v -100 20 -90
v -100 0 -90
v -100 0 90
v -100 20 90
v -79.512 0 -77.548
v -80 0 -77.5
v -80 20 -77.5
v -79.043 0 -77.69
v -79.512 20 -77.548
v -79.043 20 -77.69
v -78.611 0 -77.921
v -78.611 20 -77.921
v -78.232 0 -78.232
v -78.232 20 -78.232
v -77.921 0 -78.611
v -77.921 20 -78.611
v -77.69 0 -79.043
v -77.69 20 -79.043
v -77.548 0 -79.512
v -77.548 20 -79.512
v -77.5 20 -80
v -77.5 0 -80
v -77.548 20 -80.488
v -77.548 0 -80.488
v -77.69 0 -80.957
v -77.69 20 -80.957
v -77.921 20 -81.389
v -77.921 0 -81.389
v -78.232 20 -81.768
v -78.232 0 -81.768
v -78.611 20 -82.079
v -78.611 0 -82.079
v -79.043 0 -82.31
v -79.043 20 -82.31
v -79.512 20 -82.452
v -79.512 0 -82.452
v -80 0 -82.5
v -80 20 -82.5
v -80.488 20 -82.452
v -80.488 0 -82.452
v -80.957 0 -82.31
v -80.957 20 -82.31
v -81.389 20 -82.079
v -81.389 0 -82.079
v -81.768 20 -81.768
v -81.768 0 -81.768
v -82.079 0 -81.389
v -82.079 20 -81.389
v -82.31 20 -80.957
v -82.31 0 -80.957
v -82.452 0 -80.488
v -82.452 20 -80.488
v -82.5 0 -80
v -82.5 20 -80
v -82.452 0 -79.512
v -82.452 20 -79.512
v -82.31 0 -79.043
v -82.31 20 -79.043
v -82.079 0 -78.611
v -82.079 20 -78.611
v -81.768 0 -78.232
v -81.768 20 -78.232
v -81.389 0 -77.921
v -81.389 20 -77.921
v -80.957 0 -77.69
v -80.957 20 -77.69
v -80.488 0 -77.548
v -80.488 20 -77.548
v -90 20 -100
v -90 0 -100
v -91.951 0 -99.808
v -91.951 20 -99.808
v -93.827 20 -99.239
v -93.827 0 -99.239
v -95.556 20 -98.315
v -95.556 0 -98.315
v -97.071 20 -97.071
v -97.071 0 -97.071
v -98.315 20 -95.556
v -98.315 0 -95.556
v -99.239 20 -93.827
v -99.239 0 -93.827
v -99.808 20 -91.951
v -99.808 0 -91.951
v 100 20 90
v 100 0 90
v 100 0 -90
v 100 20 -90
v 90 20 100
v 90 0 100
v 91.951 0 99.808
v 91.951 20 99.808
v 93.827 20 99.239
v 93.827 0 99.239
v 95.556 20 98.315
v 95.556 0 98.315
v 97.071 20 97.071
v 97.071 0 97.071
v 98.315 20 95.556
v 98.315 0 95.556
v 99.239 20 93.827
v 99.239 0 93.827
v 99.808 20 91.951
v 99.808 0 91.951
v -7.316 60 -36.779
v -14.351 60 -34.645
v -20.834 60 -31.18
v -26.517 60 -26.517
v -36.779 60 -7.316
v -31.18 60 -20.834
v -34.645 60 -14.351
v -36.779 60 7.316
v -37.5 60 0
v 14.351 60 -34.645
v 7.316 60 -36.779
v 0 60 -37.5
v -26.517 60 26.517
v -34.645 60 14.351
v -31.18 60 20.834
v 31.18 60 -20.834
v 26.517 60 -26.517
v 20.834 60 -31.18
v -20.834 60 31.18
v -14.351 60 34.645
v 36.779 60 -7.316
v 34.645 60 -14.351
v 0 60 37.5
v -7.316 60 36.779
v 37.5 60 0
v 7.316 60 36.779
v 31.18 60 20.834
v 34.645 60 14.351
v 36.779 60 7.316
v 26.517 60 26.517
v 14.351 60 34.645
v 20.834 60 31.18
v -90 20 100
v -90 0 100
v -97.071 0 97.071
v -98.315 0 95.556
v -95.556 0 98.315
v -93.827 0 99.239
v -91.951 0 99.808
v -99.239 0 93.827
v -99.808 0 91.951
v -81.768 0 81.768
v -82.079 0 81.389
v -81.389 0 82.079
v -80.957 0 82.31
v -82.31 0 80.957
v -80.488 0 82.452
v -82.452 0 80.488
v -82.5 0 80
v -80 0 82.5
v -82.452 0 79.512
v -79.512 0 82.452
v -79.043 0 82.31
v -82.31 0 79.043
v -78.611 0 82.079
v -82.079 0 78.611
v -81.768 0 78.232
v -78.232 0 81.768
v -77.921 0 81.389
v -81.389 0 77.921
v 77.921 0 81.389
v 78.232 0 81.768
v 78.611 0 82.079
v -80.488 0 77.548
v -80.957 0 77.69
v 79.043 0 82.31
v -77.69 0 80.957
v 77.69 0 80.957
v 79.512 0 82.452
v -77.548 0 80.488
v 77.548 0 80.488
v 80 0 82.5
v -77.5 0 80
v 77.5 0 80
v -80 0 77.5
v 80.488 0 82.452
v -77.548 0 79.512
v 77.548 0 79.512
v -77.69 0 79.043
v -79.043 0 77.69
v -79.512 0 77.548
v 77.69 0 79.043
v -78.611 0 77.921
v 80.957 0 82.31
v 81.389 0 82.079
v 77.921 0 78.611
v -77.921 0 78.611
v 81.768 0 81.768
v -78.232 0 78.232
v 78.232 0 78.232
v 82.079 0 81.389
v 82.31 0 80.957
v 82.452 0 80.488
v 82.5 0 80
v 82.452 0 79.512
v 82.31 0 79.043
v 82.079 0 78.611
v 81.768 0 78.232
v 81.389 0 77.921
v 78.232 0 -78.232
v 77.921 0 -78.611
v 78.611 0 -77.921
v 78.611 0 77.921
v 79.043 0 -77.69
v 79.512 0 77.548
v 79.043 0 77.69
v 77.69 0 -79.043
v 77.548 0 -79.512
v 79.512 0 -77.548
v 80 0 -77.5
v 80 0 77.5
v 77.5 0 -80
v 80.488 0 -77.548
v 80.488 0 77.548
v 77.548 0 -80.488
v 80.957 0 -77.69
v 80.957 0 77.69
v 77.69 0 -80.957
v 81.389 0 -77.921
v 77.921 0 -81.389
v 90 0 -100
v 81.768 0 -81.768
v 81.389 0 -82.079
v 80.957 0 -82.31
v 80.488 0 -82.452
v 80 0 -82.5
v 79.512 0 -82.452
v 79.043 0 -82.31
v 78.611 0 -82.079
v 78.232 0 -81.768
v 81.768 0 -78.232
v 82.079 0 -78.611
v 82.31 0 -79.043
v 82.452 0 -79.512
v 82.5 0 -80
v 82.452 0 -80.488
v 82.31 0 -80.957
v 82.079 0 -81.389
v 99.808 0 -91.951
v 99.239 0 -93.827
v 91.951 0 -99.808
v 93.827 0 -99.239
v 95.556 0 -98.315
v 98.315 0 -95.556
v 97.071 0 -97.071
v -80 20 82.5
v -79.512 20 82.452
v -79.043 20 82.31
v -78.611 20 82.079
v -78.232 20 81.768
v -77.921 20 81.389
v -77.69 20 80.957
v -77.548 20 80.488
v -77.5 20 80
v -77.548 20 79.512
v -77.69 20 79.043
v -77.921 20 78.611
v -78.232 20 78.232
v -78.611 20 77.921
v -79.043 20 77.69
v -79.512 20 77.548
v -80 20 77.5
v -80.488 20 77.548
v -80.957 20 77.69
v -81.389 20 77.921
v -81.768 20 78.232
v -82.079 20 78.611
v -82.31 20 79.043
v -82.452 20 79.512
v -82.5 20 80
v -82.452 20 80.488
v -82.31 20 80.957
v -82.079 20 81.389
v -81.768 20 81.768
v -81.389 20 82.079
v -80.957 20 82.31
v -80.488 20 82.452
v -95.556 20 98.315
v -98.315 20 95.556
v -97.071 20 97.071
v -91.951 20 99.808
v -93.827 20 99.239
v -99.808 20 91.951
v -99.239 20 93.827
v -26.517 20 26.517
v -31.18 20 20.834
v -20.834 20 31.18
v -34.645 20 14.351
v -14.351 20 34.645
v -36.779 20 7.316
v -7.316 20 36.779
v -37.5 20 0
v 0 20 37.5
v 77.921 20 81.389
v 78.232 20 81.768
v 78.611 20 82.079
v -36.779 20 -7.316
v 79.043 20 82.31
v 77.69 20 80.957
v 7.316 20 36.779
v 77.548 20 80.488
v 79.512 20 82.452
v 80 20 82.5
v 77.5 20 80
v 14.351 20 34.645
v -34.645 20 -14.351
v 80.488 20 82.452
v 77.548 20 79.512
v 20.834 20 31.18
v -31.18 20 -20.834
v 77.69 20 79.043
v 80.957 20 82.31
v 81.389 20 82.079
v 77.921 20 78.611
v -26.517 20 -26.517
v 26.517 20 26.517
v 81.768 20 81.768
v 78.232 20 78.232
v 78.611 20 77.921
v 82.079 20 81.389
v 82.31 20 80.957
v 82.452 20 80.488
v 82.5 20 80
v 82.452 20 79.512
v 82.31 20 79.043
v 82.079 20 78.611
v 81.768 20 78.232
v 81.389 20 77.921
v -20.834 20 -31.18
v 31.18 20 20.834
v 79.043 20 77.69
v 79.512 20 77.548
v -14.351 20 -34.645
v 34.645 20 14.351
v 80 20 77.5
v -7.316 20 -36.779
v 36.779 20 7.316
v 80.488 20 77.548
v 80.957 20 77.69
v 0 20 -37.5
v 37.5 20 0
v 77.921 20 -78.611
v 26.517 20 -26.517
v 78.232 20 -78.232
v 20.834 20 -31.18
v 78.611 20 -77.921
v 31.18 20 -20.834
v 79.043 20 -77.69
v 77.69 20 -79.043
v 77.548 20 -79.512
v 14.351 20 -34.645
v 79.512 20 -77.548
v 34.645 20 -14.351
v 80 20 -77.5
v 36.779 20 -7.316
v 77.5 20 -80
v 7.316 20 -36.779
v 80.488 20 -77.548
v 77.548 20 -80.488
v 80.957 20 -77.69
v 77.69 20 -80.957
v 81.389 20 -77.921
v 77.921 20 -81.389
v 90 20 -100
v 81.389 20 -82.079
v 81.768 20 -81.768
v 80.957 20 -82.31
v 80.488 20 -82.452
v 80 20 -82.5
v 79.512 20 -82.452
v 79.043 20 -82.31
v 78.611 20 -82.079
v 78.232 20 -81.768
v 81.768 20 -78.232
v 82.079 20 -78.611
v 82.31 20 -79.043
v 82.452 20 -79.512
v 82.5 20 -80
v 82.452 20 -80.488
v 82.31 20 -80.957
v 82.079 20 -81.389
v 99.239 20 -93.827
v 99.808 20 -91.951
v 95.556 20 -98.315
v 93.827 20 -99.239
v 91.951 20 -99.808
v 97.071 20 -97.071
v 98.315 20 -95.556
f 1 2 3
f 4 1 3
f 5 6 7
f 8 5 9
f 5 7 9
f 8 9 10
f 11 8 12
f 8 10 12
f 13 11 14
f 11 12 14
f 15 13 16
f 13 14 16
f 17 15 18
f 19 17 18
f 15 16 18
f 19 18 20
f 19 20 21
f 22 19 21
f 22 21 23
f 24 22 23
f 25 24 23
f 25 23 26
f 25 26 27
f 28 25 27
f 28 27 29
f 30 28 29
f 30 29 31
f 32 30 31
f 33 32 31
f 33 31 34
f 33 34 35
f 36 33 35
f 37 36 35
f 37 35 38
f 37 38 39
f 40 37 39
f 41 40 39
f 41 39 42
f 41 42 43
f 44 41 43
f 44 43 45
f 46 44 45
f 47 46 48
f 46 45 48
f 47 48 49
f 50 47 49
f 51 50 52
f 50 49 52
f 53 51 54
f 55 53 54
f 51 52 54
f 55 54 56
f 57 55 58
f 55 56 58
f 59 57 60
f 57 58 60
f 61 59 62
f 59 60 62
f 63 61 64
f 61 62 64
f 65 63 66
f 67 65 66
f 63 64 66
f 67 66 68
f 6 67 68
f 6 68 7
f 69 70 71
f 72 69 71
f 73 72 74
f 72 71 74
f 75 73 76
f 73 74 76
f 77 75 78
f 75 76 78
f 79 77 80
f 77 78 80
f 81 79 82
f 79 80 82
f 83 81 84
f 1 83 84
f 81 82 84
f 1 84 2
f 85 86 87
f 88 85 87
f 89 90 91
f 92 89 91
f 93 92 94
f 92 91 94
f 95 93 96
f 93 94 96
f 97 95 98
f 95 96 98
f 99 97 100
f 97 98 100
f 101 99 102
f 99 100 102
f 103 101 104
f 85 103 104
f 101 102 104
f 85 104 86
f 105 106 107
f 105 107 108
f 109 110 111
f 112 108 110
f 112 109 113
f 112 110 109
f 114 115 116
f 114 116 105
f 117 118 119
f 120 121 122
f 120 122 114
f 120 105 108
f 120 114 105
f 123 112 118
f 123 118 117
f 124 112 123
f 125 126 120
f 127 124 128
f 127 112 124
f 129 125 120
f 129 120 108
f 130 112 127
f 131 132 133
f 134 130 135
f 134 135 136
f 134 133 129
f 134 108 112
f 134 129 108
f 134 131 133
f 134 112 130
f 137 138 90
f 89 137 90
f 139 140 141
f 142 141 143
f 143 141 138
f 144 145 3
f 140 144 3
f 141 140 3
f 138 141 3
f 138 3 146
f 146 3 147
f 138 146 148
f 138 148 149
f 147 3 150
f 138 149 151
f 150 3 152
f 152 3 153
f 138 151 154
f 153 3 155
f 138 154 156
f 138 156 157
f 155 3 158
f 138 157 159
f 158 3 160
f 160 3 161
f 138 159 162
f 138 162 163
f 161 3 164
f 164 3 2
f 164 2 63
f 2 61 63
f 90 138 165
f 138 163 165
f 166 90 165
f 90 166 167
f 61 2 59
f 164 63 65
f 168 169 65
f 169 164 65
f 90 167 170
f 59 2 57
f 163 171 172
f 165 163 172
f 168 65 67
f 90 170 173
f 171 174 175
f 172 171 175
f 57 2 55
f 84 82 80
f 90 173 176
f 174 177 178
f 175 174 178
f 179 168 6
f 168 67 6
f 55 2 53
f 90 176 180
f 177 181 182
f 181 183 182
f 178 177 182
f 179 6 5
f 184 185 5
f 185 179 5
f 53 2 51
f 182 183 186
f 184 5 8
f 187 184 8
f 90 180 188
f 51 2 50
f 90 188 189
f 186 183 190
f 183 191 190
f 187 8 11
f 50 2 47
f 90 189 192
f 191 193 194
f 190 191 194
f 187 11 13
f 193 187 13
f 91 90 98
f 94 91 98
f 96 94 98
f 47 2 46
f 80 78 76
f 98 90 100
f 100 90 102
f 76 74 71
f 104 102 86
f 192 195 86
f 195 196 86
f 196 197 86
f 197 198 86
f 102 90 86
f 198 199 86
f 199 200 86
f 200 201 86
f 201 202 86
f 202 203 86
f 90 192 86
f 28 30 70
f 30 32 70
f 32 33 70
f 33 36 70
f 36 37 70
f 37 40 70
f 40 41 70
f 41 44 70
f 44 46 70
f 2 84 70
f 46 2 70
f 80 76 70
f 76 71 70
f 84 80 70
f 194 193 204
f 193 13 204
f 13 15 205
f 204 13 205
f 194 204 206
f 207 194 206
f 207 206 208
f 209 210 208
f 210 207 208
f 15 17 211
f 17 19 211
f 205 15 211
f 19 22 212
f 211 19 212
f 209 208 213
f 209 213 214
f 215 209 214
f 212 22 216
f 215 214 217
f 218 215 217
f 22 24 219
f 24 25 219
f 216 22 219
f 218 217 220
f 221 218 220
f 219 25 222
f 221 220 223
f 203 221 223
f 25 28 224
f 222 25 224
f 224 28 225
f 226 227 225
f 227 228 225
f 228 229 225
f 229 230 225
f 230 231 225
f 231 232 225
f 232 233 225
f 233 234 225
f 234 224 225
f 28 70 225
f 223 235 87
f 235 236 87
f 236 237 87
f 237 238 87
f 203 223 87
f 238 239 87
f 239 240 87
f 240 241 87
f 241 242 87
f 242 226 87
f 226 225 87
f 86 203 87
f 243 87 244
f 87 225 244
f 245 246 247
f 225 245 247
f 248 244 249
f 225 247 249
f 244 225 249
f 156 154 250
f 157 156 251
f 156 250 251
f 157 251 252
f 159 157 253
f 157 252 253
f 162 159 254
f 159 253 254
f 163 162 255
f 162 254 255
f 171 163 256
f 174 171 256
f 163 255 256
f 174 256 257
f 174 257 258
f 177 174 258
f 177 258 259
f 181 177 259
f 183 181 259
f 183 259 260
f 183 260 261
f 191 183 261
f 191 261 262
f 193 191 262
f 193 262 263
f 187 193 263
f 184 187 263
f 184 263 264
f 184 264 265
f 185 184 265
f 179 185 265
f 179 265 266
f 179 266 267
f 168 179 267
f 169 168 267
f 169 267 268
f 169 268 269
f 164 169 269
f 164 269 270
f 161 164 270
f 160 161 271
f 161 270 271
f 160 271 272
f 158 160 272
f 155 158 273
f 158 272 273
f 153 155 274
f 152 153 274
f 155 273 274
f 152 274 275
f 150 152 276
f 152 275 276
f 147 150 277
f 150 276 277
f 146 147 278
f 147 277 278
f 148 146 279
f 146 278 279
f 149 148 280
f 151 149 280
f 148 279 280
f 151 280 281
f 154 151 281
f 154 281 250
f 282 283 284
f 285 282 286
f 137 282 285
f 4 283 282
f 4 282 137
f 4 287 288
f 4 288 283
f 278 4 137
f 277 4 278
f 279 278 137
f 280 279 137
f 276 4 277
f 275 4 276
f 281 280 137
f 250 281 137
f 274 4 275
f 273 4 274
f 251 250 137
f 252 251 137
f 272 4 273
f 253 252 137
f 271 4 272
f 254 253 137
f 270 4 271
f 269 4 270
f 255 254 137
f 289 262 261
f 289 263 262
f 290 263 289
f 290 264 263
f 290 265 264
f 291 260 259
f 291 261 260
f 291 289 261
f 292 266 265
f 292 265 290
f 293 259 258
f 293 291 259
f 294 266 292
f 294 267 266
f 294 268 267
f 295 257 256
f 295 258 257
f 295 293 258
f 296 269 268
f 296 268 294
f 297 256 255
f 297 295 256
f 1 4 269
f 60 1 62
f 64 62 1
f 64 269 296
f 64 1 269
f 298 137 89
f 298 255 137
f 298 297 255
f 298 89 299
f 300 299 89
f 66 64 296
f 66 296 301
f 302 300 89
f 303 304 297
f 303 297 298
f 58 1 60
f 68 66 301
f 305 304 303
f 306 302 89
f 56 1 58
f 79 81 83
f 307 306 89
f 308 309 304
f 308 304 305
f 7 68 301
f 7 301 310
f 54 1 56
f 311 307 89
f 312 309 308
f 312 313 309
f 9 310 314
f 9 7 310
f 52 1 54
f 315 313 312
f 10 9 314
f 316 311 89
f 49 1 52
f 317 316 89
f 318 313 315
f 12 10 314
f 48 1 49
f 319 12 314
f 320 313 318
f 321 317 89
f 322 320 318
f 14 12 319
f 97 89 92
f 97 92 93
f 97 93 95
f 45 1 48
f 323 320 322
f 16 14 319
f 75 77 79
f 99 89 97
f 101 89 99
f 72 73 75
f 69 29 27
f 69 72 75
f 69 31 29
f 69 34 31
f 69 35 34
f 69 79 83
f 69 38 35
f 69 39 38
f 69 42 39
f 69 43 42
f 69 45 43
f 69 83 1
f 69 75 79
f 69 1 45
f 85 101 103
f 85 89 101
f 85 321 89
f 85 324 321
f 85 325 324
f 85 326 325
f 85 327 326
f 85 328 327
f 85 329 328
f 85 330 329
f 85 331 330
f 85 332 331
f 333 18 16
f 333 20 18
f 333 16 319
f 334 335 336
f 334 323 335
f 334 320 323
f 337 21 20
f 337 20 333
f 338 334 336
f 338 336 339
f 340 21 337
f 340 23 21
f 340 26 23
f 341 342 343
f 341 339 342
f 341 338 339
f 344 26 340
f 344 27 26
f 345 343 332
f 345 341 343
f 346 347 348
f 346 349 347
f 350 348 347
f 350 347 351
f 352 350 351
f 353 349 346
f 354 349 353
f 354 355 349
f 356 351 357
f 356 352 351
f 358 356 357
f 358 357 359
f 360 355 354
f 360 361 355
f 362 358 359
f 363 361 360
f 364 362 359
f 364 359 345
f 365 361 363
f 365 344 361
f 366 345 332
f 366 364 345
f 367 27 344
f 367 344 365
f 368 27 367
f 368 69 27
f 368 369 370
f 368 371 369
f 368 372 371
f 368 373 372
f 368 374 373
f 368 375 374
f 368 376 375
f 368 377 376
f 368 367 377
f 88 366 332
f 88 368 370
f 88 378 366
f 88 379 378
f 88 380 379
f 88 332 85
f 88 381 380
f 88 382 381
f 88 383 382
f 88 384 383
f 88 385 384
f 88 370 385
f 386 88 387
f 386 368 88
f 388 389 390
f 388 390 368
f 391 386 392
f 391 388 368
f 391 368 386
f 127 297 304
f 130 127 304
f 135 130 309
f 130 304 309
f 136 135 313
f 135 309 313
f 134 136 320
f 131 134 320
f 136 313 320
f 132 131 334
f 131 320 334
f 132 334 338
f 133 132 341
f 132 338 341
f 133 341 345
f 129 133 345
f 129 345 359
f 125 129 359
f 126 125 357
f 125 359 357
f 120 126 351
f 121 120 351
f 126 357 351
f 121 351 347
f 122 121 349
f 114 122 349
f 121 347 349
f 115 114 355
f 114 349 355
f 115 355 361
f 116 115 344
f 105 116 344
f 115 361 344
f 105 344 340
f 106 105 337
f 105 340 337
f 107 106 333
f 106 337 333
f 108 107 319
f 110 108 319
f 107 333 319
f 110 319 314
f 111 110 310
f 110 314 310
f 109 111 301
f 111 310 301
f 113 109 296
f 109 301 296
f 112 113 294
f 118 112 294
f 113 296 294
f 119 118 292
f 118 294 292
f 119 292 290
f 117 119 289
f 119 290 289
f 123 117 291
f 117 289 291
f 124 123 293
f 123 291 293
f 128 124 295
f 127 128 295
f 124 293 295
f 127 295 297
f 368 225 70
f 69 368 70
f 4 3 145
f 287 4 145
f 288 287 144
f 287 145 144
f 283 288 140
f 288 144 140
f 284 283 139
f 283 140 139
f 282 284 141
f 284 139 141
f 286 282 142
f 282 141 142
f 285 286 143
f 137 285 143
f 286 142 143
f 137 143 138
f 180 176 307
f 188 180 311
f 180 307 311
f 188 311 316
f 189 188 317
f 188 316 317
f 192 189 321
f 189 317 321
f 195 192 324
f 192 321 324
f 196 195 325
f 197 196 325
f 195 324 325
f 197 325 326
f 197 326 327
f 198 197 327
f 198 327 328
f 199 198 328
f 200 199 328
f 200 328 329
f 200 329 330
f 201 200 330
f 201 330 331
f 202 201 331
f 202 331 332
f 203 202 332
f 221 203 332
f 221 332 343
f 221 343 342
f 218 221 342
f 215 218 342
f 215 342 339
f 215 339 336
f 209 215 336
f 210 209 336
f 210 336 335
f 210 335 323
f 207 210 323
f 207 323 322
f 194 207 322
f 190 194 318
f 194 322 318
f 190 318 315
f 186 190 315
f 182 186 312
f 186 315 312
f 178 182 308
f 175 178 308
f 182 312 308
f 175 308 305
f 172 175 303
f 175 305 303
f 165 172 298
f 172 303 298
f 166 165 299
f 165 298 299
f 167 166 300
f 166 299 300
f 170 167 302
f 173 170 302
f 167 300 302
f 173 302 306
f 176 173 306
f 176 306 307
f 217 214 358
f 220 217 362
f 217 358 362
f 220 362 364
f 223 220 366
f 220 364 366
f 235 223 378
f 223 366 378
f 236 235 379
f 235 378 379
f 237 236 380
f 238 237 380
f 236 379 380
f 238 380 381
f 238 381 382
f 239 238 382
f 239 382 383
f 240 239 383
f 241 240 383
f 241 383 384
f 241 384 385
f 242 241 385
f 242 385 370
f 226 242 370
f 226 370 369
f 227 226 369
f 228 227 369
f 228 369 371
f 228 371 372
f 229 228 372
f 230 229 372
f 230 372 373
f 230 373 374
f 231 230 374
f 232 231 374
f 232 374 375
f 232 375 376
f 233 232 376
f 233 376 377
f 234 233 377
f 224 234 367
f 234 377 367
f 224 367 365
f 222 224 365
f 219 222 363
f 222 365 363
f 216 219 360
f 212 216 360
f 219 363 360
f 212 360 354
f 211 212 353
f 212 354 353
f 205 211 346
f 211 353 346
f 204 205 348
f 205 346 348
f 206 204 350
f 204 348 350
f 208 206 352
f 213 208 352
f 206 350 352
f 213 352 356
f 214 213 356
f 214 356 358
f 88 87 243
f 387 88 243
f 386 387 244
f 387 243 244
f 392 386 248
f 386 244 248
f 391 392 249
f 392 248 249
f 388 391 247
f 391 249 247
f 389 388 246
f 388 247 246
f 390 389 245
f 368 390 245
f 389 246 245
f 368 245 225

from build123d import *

# Parameters (mm, degrees)
BOSS_EXTRUDE1_DEPTH = 20
SKETCH2_R           = 37.5
BOSS_EXTRUDE2_DEPTH = 40
CUT_EXTRUDE1_REACH  = 148.969
SKETCH3_R           = 2.5


with BuildPart() as part:
    # Sketch1 → Boss-Extrude1 (new body)
    with BuildSketch(Plane(origin=(0, 0, 0), x_dir=(1, 0, 0), z_dir=(0, 1, 0))):
        with BuildLine():
            Line((-90, -100), (90, -100))
            ThreePointArc((90, -100), (97.071067812, -97.071067812), (100, -90))
            Line((100, -90), (100, 90))
            ThreePointArc((100, 90), (97.071067812, 97.071067812), (90, 100))
            Line((90, 100), (-90, 100))
            ThreePointArc((-90, 100), (-97.071067812, 97.071067812), (-100, 90))
            Line((-100, 90), (-100, -90))
            ThreePointArc((-100, -90), (-97.071067812, -97.071067812), (-90, -100))
        make_face()
    extrude(amount=BOSS_EXTRUDE1_DEPTH)

    # Sketch2 → Boss-Extrude2 (add)
    with BuildSketch(Plane(origin=(0, 20, 0), x_dir=(1, 0, 0), z_dir=(0, 1, 0))):
        with Locations(Location((0, 0, 0), (0, 0, 270))):
            Circle(SKETCH2_R)
    extrude(amount=BOSS_EXTRUDE2_DEPTH)

    # Sketch3 → Cut-Extrude1 (cut, up to next)
    with BuildSketch(Plane(origin=(0, 20, 0), x_dir=(1, 0, 0), z_dir=(0, 1, 0)), mode=Mode.PRIVATE) as cut_extrude1_sk1:
        with Locations(Location((-80, 80, 0), (0, 0, 270))):
            Circle(SKETCH3_R)
    cut_extrude1_tool1 = extrude(cut_extrude1_sk1.sketch, amount=-CUT_EXTRUDE1_REACH, mode=Mode.PRIVATE) & part.part
    # Sketch3 → Cut-Extrude1 (cut, up to next)
    with BuildSketch(Plane(origin=(0, 20, 0), x_dir=(1, 0, 0), z_dir=(0, 1, 0)), mode=Mode.PRIVATE) as cut_extrude1_sk2:
        with Locations(Location((80, 80, 0), (0, 0, 270))):
            Circle(SKETCH3_R)
    cut_extrude1_tool2 = extrude(cut_extrude1_sk2.sketch, amount=-CUT_EXTRUDE1_REACH, mode=Mode.PRIVATE) & part.part
    # Sketch3 → Cut-Extrude1 (cut, up to next)
    with BuildSketch(Plane(origin=(0, 20, 0), x_dir=(1, 0, 0), z_dir=(0, 1, 0)), mode=Mode.PRIVATE) as cut_extrude1_sk3:
        with Locations(Location((80, -80, 0), (0, 0, 270))):
            Circle(SKETCH3_R)
    cut_extrude1_tool3 = extrude(cut_extrude1_sk3.sketch, amount=-CUT_EXTRUDE1_REACH, mode=Mode.PRIVATE) & part.part
    # Sketch3 → Cut-Extrude1 (cut, up to next)
    with BuildSketch(Plane(origin=(0, 20, 0), x_dir=(1, 0, 0), z_dir=(0, 1, 0)), mode=Mode.PRIVATE) as cut_extrude1_sk4:
        with Locations(Location((-80, -80, 0), (0, 0, 270))):
            Circle(SKETCH3_R)
    cut_extrude1_tool4 = extrude(cut_extrude1_sk4.sketch, amount=-CUT_EXTRUDE1_REACH, mode=Mode.PRIVATE) & part.part
    add(cut_extrude1_tool1.solids().sort_by_distance((-80, 20, -80))[0], mode=Mode.SUBTRACT)
    add(cut_extrude1_tool2.solids().sort_by_distance((80, 20, -80))[0], mode=Mode.SUBTRACT)
    add(cut_extrude1_tool3.solids().sort_by_distance((80, 20, 80))[0], mode=Mode.SUBTRACT)
    add(cut_extrude1_tool4.solids().sort_by_distance((-80, 20, 80))[0], mode=Mode.SUBTRACT)


solid = part.part
